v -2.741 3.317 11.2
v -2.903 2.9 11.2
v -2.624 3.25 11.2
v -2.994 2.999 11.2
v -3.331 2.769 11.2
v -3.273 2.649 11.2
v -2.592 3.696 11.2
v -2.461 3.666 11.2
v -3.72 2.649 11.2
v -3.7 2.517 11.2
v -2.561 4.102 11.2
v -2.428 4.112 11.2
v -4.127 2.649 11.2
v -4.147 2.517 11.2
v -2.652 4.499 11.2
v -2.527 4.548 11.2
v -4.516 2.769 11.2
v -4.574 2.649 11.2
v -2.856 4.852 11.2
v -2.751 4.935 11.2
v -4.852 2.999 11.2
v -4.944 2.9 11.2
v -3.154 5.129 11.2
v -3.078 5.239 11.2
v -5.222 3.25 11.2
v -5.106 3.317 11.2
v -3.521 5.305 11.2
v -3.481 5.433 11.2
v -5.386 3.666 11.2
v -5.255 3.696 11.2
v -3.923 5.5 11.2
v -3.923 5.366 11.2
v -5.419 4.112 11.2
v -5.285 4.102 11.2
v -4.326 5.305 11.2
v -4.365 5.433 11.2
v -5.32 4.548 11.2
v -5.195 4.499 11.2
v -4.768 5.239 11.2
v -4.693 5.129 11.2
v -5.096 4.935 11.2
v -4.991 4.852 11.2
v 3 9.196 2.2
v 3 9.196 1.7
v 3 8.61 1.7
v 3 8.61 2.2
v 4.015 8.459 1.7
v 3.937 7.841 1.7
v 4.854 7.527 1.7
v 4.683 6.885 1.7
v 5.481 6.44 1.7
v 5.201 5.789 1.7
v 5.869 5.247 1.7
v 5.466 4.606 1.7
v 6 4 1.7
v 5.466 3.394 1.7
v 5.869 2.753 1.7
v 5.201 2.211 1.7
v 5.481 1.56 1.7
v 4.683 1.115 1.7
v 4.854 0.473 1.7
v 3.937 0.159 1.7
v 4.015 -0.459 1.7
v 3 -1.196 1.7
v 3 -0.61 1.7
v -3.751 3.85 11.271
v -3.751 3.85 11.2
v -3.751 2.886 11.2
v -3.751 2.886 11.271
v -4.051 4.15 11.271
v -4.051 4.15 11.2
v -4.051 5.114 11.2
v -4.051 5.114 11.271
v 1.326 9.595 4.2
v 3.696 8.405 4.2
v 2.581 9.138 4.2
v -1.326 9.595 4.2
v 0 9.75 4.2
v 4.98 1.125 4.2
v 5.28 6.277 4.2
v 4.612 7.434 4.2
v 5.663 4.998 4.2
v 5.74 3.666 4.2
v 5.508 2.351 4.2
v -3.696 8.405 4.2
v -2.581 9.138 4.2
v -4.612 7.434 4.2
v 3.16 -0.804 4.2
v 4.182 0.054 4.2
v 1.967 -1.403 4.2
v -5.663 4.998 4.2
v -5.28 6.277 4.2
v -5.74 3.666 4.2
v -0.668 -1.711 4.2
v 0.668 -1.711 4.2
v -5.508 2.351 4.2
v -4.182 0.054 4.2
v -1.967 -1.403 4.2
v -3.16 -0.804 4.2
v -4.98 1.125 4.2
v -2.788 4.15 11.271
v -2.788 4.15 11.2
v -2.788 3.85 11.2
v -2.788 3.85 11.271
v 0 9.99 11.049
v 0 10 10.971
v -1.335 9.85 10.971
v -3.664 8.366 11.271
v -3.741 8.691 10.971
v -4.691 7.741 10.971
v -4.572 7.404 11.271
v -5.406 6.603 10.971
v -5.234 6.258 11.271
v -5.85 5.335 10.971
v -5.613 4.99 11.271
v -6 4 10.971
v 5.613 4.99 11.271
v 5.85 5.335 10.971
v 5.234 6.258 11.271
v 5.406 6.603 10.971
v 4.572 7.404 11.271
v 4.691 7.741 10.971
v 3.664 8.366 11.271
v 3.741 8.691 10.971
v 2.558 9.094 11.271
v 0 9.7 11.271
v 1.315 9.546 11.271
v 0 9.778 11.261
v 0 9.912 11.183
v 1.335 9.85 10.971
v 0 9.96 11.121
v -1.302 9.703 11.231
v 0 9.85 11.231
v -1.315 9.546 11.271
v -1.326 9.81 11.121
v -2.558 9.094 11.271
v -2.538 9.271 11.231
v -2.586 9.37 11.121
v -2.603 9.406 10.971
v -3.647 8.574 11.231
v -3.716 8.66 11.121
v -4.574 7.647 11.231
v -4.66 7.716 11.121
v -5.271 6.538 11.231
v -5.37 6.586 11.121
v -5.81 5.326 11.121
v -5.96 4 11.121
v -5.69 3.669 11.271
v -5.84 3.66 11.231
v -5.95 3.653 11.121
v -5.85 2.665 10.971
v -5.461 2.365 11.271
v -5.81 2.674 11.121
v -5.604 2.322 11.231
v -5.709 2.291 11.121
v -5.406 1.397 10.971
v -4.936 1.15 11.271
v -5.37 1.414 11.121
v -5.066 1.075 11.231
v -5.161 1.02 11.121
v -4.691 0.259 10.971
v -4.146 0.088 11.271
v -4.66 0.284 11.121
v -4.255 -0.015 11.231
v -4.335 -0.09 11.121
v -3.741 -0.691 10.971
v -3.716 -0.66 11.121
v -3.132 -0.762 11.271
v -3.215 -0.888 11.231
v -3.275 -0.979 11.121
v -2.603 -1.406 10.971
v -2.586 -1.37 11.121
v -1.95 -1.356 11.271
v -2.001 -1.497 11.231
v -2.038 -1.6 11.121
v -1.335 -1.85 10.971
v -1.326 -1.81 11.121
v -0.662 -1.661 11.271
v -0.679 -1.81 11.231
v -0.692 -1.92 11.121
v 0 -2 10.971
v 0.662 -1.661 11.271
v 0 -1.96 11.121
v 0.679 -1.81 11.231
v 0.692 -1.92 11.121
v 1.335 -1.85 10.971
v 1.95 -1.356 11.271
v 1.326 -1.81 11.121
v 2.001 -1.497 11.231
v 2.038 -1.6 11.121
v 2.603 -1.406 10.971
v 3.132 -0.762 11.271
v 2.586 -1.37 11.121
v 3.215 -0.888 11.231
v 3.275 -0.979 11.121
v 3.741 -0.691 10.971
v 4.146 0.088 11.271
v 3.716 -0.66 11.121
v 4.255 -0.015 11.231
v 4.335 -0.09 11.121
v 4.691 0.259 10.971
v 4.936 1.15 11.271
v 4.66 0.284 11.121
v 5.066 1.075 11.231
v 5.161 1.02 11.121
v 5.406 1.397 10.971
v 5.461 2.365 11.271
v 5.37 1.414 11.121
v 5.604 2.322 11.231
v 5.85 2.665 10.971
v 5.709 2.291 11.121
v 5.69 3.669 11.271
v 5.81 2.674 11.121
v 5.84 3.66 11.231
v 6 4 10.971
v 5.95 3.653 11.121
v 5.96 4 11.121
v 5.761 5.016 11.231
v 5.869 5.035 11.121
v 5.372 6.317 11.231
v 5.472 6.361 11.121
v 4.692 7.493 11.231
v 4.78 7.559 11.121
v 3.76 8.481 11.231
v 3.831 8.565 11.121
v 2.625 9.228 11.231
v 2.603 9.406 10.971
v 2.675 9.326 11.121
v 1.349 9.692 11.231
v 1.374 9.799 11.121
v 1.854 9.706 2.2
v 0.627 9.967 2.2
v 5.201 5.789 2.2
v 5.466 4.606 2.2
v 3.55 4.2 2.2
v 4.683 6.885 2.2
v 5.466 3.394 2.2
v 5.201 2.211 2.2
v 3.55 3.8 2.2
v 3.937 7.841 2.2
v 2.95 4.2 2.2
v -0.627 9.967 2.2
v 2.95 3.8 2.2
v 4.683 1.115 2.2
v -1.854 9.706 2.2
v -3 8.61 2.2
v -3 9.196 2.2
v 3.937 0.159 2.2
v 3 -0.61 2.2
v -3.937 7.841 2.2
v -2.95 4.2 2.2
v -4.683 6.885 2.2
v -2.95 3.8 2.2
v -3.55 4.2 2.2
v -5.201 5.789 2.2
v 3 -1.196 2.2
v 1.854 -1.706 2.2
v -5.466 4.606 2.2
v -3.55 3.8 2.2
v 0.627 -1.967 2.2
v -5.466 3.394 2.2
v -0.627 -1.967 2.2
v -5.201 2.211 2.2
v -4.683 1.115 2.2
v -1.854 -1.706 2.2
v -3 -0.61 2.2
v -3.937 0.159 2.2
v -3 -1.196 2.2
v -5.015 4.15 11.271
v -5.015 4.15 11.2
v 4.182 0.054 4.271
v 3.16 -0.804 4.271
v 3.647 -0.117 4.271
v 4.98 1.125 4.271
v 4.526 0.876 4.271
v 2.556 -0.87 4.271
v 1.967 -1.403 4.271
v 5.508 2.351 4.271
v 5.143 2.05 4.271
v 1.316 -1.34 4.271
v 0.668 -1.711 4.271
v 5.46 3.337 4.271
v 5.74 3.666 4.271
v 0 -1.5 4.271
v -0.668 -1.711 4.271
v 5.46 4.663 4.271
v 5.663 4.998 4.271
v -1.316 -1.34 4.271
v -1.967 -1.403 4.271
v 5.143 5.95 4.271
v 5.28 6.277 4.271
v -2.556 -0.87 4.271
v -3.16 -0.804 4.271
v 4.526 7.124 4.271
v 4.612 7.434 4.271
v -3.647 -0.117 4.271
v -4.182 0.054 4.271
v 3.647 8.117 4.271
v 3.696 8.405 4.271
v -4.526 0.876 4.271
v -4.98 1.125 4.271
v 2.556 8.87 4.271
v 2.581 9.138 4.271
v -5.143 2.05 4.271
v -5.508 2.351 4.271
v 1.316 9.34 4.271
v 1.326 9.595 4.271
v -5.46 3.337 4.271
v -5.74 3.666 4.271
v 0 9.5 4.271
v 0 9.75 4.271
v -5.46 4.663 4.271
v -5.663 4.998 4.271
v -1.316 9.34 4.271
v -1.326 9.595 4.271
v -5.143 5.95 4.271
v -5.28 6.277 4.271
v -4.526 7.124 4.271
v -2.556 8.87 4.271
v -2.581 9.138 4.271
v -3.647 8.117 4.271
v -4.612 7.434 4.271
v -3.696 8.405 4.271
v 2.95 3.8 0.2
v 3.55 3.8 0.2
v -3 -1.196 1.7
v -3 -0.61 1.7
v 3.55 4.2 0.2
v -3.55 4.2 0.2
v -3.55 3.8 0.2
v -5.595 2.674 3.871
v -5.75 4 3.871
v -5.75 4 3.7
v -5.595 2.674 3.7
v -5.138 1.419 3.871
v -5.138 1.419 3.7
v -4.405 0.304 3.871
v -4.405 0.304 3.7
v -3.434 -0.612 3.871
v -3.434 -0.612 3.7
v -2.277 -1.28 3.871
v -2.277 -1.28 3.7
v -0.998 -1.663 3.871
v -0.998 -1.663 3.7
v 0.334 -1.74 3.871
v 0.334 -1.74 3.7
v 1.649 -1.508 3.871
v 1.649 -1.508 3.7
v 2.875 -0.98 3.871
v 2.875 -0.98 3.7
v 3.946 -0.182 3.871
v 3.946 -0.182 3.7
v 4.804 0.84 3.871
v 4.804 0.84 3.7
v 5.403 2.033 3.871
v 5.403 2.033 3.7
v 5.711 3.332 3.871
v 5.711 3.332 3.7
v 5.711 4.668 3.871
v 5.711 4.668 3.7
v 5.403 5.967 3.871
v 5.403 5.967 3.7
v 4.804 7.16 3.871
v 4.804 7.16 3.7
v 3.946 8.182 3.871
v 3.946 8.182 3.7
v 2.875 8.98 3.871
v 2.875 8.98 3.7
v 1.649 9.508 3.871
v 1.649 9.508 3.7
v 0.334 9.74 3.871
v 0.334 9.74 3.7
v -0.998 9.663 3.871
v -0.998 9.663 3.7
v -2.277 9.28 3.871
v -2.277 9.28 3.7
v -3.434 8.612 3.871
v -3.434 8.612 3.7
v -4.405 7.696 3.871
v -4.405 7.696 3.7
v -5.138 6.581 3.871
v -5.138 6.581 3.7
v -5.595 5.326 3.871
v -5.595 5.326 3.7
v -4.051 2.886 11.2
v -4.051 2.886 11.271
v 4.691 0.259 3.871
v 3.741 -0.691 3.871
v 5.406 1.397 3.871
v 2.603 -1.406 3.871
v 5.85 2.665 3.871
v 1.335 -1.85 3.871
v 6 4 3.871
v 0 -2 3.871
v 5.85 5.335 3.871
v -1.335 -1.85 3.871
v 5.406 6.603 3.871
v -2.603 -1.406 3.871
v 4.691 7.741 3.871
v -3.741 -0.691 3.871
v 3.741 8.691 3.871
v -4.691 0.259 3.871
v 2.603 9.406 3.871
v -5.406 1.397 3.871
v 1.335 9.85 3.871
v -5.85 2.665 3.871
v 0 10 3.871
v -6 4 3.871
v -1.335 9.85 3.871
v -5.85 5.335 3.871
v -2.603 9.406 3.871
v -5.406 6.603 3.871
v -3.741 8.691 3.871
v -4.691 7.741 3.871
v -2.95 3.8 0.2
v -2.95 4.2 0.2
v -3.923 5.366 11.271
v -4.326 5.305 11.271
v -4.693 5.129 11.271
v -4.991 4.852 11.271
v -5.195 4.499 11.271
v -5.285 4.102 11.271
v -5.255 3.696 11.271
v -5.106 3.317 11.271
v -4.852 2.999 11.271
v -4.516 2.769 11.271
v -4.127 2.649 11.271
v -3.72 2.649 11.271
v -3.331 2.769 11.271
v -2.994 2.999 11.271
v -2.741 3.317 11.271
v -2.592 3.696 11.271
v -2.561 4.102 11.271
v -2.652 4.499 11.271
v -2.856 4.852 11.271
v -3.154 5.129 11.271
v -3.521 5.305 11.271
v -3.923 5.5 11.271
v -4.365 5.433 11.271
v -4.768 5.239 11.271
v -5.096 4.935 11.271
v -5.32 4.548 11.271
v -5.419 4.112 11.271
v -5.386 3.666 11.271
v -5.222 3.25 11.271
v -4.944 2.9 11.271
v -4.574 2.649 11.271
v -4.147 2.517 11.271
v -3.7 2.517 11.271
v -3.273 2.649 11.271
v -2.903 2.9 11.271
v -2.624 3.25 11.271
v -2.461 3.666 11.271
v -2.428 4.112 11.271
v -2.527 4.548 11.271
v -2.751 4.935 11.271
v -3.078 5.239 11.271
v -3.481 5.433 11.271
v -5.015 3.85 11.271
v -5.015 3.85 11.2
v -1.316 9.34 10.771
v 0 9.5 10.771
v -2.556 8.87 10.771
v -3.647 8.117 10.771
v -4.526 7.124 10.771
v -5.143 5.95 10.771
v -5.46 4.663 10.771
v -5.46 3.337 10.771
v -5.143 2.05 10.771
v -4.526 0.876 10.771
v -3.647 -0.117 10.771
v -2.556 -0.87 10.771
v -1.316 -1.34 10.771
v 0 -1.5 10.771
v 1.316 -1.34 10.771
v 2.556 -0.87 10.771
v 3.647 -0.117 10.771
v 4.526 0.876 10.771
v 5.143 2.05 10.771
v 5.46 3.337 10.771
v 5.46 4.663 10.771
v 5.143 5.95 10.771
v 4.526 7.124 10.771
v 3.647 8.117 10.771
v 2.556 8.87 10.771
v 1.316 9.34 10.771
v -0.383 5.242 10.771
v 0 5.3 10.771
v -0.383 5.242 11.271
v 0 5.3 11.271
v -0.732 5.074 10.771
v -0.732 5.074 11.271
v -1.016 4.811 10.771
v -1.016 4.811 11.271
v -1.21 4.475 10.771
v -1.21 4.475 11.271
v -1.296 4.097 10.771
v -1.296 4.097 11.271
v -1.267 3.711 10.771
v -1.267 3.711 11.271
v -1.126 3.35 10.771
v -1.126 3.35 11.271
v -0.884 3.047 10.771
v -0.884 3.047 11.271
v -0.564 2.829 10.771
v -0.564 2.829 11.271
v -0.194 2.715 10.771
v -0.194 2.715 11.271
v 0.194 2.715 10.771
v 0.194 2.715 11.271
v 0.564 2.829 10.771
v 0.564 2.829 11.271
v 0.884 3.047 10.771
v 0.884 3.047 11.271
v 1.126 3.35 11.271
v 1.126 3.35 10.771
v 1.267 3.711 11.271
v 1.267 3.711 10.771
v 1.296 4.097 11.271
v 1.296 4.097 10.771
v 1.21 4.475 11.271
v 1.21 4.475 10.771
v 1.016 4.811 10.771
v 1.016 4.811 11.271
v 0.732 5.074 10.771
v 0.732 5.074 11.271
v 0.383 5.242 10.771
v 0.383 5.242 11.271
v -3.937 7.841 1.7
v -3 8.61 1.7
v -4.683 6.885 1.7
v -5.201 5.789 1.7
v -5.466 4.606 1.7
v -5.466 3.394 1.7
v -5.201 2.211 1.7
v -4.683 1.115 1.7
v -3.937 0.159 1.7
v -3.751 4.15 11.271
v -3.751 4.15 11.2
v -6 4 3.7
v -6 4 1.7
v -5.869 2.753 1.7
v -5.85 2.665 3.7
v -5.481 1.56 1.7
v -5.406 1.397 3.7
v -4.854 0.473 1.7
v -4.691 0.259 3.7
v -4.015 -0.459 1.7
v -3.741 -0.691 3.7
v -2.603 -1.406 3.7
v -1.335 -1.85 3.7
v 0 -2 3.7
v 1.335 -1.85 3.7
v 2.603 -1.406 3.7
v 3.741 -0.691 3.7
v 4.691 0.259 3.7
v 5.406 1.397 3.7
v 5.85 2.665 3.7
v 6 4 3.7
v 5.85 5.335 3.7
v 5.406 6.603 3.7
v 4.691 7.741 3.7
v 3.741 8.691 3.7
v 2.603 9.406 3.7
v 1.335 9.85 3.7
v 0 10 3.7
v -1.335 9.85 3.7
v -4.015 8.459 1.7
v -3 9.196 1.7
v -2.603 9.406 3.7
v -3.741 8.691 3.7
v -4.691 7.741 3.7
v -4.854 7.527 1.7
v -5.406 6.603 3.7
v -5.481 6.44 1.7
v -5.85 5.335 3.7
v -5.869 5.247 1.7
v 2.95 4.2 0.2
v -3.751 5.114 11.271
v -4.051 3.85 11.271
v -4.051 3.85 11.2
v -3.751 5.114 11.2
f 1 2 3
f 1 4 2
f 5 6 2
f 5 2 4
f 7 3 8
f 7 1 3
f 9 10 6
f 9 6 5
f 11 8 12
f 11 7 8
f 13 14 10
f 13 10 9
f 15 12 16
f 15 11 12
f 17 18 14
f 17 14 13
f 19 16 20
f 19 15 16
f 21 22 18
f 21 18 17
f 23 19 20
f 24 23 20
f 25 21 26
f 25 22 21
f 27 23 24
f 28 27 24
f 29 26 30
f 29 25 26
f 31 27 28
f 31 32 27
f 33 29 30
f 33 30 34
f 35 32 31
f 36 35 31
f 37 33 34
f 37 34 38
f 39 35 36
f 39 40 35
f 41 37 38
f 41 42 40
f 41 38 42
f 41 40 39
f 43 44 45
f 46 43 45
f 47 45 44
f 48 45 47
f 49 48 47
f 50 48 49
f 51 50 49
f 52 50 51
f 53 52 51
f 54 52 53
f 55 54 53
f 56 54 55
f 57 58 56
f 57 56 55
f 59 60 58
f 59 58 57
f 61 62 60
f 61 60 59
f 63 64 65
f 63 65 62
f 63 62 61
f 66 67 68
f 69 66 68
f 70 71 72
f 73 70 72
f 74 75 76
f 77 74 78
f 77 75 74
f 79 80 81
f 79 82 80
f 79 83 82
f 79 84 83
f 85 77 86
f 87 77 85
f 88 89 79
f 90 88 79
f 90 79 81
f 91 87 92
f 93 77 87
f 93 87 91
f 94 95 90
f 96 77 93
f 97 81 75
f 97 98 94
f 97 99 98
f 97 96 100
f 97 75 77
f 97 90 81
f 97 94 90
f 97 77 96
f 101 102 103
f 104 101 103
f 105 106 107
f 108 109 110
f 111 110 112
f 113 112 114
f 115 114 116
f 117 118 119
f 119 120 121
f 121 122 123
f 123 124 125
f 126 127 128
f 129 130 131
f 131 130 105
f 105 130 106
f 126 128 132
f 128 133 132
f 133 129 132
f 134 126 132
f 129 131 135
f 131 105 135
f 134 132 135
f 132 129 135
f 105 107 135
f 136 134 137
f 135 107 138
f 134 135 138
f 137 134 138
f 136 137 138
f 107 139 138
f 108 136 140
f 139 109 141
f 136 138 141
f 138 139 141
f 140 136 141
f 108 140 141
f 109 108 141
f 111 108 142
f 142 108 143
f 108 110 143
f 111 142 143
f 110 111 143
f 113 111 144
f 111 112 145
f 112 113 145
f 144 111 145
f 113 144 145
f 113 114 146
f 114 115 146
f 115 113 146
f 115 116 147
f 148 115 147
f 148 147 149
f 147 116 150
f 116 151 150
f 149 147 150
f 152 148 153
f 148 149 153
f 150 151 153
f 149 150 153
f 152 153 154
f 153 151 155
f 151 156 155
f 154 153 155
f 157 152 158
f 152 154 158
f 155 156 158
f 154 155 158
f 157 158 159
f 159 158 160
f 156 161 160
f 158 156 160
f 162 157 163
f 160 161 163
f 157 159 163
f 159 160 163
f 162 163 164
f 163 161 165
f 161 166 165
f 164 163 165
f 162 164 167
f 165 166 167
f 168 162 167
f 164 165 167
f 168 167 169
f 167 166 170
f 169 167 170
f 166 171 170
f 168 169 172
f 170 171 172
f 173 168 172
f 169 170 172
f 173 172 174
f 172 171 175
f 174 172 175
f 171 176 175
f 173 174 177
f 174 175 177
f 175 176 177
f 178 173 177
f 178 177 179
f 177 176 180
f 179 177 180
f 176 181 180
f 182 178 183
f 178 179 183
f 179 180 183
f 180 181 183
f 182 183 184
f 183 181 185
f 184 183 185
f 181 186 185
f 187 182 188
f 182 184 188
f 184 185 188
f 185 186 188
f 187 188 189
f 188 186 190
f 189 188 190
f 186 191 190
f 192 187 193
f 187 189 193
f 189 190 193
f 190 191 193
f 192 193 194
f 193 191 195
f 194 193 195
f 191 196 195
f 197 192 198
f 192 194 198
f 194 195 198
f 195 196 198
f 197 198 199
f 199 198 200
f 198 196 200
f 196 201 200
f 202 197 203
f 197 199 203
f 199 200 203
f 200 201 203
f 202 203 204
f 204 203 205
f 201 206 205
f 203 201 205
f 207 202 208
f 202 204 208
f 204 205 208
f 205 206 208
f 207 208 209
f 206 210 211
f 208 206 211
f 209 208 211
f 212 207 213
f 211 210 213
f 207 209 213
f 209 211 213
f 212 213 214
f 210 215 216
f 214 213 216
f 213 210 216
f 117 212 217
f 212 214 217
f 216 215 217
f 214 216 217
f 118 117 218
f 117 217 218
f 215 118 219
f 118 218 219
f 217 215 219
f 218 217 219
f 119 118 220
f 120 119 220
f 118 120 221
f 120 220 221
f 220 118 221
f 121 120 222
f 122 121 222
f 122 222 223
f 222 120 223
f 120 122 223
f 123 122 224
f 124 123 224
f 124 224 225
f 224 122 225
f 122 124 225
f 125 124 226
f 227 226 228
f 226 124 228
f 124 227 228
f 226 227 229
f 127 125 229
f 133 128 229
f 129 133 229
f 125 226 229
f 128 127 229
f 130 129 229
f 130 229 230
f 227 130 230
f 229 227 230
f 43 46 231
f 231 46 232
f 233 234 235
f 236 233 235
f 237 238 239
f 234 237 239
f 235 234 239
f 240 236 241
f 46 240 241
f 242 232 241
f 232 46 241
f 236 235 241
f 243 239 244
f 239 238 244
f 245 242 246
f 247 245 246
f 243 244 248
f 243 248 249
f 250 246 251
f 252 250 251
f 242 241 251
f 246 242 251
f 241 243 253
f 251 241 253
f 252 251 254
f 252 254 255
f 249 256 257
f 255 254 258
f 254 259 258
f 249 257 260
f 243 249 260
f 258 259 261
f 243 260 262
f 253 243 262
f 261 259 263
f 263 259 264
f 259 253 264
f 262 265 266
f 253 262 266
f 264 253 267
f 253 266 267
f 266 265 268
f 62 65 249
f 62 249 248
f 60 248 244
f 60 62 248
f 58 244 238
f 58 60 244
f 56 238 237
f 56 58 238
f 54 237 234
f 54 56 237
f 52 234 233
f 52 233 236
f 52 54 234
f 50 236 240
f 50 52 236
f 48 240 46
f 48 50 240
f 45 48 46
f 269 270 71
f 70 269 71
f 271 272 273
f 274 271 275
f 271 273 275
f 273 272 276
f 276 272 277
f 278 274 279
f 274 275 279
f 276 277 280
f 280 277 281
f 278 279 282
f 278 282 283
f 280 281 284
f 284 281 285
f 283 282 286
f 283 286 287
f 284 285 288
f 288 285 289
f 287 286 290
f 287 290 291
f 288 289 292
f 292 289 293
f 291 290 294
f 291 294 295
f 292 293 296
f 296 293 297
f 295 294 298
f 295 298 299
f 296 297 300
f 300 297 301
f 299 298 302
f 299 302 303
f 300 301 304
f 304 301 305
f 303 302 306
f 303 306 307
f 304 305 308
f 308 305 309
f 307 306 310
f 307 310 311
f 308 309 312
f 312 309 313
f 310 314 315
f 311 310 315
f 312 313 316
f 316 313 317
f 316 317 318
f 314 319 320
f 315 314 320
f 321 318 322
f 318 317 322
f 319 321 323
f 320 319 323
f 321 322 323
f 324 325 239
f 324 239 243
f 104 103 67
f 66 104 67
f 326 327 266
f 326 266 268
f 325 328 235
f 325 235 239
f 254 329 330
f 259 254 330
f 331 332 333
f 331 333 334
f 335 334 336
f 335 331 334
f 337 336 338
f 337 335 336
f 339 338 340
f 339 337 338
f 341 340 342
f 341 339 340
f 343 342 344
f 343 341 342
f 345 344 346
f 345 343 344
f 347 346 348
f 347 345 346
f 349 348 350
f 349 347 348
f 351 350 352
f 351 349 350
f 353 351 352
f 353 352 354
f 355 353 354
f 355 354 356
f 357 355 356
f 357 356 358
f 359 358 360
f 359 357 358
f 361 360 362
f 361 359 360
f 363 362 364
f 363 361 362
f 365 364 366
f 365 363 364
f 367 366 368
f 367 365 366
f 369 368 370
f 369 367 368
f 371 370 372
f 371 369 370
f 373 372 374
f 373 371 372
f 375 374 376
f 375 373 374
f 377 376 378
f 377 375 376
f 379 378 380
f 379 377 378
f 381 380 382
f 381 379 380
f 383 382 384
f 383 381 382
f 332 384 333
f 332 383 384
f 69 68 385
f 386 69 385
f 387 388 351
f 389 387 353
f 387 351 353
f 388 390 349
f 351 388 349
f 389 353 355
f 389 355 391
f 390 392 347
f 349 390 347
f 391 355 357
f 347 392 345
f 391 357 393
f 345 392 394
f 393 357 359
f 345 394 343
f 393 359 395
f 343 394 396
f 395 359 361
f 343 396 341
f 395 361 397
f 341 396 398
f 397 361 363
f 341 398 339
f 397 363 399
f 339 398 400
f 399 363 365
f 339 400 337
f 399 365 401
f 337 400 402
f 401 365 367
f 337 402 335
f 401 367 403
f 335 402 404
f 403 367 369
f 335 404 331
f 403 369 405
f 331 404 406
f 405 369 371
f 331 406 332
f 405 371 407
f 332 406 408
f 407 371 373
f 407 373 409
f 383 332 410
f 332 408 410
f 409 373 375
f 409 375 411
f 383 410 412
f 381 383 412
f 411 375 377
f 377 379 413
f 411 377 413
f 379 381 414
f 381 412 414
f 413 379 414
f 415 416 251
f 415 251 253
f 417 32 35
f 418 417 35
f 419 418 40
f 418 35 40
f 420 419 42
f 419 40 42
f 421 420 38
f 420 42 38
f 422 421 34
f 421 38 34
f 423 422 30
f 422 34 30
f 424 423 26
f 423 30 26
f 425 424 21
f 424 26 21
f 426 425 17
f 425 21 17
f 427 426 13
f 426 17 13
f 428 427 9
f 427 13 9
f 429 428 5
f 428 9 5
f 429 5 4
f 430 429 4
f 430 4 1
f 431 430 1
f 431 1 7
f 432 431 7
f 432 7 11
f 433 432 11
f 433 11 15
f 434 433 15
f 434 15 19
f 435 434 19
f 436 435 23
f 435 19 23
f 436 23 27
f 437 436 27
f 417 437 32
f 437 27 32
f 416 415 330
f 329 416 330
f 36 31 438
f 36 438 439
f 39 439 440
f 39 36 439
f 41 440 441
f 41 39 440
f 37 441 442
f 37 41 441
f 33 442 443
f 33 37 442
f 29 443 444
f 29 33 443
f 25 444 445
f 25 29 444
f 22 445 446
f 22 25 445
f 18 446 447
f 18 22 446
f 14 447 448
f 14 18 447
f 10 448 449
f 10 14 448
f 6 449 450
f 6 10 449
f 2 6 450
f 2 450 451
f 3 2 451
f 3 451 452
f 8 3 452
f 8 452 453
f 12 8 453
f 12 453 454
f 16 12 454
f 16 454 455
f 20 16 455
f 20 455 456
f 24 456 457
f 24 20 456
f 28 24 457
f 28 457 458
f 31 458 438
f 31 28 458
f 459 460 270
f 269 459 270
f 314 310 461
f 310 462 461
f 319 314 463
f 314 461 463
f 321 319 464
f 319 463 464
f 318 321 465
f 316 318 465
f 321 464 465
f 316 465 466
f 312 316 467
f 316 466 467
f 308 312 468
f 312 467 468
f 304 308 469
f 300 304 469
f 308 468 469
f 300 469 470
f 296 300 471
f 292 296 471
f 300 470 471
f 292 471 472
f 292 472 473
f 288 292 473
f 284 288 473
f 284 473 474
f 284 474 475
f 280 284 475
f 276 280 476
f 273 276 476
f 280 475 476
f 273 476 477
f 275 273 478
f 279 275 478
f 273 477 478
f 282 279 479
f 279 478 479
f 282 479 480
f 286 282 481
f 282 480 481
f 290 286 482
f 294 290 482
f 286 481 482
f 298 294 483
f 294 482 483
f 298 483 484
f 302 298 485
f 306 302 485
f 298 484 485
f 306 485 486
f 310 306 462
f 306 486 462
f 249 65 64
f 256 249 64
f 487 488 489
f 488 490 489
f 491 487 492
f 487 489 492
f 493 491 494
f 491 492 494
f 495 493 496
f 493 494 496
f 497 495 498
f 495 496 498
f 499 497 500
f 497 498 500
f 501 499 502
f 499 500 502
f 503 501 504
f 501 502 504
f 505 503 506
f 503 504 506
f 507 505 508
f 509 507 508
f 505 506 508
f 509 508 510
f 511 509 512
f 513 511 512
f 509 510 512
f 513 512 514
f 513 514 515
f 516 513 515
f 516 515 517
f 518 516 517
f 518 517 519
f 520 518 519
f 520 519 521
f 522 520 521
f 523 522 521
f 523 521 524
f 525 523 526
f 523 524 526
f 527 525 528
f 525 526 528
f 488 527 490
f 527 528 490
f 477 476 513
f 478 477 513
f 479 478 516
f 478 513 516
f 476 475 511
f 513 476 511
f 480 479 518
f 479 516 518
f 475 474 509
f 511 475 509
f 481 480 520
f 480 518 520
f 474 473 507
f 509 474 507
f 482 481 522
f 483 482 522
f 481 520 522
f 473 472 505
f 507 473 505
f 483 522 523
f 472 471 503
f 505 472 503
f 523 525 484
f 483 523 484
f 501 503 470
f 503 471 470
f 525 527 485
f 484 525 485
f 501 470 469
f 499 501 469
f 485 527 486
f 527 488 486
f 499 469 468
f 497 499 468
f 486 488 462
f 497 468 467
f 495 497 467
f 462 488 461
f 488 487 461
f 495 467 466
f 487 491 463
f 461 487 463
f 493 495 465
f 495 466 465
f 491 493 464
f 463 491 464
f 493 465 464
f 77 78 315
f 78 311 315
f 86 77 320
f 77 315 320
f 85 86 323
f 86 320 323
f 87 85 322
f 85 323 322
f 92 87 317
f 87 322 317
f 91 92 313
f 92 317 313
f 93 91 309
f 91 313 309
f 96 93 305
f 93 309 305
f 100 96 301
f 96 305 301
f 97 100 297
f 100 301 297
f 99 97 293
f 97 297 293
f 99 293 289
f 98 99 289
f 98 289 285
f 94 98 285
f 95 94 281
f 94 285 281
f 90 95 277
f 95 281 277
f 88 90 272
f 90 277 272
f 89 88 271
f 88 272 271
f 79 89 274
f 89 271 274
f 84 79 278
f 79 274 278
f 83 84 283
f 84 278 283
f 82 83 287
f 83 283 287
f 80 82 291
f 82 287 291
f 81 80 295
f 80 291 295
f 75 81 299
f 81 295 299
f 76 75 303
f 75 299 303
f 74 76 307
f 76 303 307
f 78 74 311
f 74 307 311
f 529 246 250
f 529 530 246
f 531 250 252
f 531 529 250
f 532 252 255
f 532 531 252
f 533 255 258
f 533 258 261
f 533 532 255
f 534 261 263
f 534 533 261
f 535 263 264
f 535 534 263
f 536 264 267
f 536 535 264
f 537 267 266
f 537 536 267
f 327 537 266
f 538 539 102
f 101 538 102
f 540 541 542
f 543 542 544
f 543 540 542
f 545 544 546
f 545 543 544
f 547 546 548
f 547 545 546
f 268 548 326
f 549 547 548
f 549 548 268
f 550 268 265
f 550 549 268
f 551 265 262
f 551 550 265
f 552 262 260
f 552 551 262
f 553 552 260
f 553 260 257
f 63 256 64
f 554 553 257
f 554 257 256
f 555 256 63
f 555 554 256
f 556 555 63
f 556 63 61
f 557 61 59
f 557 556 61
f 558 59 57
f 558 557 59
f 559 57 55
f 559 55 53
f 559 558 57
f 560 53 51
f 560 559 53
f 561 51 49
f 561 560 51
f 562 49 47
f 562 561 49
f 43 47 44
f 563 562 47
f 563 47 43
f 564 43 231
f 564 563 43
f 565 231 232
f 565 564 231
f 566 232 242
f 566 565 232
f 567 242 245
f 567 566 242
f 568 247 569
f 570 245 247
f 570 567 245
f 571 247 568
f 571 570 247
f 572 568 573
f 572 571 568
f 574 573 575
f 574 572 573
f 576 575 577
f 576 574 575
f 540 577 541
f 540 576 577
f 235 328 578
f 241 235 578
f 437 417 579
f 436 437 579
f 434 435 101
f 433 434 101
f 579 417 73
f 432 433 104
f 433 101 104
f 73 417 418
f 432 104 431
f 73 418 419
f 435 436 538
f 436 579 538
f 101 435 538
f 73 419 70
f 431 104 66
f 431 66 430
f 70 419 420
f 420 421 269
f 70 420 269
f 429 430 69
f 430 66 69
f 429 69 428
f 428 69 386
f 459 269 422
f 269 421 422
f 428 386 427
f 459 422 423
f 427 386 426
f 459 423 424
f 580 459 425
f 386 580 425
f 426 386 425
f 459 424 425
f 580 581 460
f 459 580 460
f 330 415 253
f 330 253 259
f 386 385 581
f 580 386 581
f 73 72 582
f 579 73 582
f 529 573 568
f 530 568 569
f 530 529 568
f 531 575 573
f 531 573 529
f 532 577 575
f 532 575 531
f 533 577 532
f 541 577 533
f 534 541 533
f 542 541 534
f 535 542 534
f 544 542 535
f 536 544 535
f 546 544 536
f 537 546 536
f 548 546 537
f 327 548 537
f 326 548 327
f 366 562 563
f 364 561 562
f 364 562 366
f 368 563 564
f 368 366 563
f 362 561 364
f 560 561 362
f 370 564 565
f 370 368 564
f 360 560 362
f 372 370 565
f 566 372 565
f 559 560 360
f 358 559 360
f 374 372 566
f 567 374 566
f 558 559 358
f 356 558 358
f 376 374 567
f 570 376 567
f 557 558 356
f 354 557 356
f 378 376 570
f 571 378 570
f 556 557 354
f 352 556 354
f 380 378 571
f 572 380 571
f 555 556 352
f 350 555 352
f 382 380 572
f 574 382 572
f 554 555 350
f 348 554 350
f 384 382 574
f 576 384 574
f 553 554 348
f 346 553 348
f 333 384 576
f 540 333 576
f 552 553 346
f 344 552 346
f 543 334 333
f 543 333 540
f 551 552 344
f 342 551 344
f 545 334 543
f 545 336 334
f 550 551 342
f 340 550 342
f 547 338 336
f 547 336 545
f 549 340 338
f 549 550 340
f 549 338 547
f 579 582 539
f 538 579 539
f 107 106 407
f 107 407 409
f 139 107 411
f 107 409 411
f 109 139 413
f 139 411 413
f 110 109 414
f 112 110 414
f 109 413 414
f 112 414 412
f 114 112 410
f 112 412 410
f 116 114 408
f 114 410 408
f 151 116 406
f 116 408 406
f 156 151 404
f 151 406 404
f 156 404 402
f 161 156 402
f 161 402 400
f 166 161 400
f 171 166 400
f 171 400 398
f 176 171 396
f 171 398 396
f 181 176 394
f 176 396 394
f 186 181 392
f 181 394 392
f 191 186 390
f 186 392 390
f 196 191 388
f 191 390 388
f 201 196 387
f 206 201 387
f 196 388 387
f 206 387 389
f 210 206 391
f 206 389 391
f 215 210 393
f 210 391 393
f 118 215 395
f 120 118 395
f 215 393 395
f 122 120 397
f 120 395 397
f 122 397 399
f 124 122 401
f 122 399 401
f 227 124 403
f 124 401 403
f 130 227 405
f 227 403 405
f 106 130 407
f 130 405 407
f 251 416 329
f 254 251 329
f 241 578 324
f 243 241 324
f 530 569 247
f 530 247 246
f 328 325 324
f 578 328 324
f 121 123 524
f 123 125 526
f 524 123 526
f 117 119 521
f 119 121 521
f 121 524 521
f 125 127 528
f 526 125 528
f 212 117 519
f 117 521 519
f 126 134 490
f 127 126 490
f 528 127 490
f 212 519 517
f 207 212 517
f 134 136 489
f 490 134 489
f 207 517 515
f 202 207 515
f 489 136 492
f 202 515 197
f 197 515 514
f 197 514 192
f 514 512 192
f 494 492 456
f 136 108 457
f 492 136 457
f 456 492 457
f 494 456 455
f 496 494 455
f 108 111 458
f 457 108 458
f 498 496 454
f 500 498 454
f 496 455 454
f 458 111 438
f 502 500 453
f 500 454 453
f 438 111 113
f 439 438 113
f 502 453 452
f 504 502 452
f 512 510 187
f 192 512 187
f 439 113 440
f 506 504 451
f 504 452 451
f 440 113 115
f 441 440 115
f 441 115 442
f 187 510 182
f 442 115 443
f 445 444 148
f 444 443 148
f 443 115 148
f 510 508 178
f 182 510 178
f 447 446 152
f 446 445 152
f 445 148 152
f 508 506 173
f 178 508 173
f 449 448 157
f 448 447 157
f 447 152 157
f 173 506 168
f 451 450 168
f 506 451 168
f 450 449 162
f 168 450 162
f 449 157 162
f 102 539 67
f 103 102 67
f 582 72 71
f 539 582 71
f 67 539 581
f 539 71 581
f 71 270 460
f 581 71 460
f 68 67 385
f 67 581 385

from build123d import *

# Parameters (mm, degrees)
BOX_W                     = 0.6
BOX_H                     = 0.4
BOX_DEPTH                 = 2.5
BOX002_W                  = 0.6
BOX002_H                  = 0.4
BOX002_DEPTH              = 2.5
CYLINDER002_R             = 5.5
CYLINDER002_DEPTH         = 2
FUSION002_PLACEMENT_ANGLE = 90
BOX001_W                  = 6
BOX001_H                  = 15
BOX001_DEPTH              = 0.5
CUT005_PLACEMENT_ANGLE    = 90
PAD003_DEPTH              = 5
SKETCH004_R               = 1.5
SKETCH004_R_2             = 1.365842
PAD004_DEPTH              = 5
FILLET_R                  = 0.3
FUSION001_PLACEMENT_ANGLE = 90


with BuildPart() as pata1_buzzer:
    # Box → Box (new body)
    with BuildSketch(Plane(origin=(2.95, -0.2, -2), x_dir=(1, 0, 0), z_dir=(0, 0, 1))):
        with Locations((0.3, 0.2)):
            Rectangle(BOX_W, BOX_H)
    extrude(amount=BOX_DEPTH)


with BuildPart() as pata2_buzzer:
    # Box002 → Box002 (new body)
    with BuildSketch(Plane(origin=(-3.55, -0.2, -2), x_dir=(1, 0, 0), z_dir=(0, 0, 1))):
        with Locations((0.3, 0.2)):
            Rectangle(BOX002_W, BOX002_H)
    extrude(amount=BOX002_DEPTH)


with BuildPart() as interior_buzzer:
    # Cylinder002 → Cylinder002 (new body)
    with BuildSketch(Plane.XY):
        Circle(CYLINDER002_R)
    extrude(amount=CYLINDER002_DEPTH)

    # Fusion002: union pata1_buzzer, pata2_buzzer
    add(pata1_buzzer.part)
    add(pata2_buzzer.part)


with BuildPart() as interior_buzzer_1:
    # Fusion002 placement: moved
    add(interior_buzzer.part.moved(Location((0, 0, 0.5))).rotate(Axis((0, 0, 0.5), (0, 0, 1)), FUSION002_PLACEMENT_ANGLE))


with BuildPart() as rebaje_aroinf:
    # Box001 → Box001 (new body)
    with BuildSketch(Plane(origin=(-3, -7, 0), x_dir=(1, 0, 0), z_dir=(0, 0, 1))):
        with Locations((3, 7.5)):
            Rectangle(BOX001_W, BOX001_H)
    extrude(amount=BOX001_DEPTH)


with BuildPart() as aroinferior:
    # Sketch002 → Revolution001 (revolve)
    with BuildSketch(Plane.XZ):
        Polygon((5.5, 2.5), (5.5, 0), (6, 0), (6, 2), (5.75, 2), (5.75, 2.5), align=None)
    revolve(axis=Axis((0, 0, 0), (0, 0, 1)))

    # Cut005: cut Rebaje_AroInf
    add(rebaje_aroinf.part, mode=Mode.SUBTRACT)


with BuildPart() as aroinferior_1:
    # Cut005 placement: moved
    add(aroinferior.part.rotate(Axis((0, 0, 0), (0, 0, 1)), CUT005_PLACEMENT_ANGLE))


with BuildPart() as ext_troquelplus:
    # Sketch005 → Pad003 (new body)
    with BuildSketch(Plane.XY.offset(9.5)):
        Polygon((-0.15, 5.014959), (0.15, 5.014959), (0.15, 4.051414), (1.113545, 4.051414), (1.113545, 3.751414), (0.15, 3.751414), (0.15, 2.787869), (-0.15, 2.787869), (-0.15, 3.751414), (-1.113545, 3.751414), (-1.113545, 4.051414), (-0.15, 4.051414), align=None)
    extrude(amount=PAD003_DEPTH)


with BuildPart() as ext_troquelcirc:
    # Sketch004 → Pad004 (new body)
    with BuildSketch(Plane.XY.offset(9.5)):
        with Locations((0, 3.923361)):
            Circle(SKETCH004_R)
        with Locations((0, 3.923361)):
            Circle(SKETCH004_R_2, mode=Mode.SUBTRACT)
    extrude(amount=PAD004_DEPTH)


with BuildPart() as buzzer:
    # Sketch003 → Revolution (revolve)
    with BuildSketch(Plane.XZ):
        Polygon((1.3, 9.57124), (6, 9.57124), (6, 2.17124), (5.75, 2.17124), (5.75, 2.57124), (5.5, 2.57124), (5.5, 9.07124), (1.3, 9.07124), align=None)
    revolve(axis=Axis((0, 0, 0), (0, 0, 1)))

    # Fillet
    fillet_edges = [buzzer.edges().sort_by_distance(p)[0] for p in [
        (-6, 0, 9.57124),
    ]]
    fillet(fillet_edges, radius=FILLET_R)

    # Cut004: cut Ext_troquelCirc
    add(ext_troquelcirc.part, mode=Mode.SUBTRACT)

    # Cut003: cut Ext_TroquelPlus
    add(ext_troquelplus.part, mode=Mode.SUBTRACT)

    # Fusion001: union Interior_buzzer, AroInferior
    add(interior_buzzer_1.part)
    add(aroinferior_1.part)


with BuildPart() as buzzer_1:
    # Fusion001 placement: moved
    add(buzzer.part.moved(Location((0, 4, 1.7))).rotate(Axis((0, 4, 1.7), (0, 0, 1)), FUSION001_PLACEMENT_ANGLE))


solid = buzzer_1.part
